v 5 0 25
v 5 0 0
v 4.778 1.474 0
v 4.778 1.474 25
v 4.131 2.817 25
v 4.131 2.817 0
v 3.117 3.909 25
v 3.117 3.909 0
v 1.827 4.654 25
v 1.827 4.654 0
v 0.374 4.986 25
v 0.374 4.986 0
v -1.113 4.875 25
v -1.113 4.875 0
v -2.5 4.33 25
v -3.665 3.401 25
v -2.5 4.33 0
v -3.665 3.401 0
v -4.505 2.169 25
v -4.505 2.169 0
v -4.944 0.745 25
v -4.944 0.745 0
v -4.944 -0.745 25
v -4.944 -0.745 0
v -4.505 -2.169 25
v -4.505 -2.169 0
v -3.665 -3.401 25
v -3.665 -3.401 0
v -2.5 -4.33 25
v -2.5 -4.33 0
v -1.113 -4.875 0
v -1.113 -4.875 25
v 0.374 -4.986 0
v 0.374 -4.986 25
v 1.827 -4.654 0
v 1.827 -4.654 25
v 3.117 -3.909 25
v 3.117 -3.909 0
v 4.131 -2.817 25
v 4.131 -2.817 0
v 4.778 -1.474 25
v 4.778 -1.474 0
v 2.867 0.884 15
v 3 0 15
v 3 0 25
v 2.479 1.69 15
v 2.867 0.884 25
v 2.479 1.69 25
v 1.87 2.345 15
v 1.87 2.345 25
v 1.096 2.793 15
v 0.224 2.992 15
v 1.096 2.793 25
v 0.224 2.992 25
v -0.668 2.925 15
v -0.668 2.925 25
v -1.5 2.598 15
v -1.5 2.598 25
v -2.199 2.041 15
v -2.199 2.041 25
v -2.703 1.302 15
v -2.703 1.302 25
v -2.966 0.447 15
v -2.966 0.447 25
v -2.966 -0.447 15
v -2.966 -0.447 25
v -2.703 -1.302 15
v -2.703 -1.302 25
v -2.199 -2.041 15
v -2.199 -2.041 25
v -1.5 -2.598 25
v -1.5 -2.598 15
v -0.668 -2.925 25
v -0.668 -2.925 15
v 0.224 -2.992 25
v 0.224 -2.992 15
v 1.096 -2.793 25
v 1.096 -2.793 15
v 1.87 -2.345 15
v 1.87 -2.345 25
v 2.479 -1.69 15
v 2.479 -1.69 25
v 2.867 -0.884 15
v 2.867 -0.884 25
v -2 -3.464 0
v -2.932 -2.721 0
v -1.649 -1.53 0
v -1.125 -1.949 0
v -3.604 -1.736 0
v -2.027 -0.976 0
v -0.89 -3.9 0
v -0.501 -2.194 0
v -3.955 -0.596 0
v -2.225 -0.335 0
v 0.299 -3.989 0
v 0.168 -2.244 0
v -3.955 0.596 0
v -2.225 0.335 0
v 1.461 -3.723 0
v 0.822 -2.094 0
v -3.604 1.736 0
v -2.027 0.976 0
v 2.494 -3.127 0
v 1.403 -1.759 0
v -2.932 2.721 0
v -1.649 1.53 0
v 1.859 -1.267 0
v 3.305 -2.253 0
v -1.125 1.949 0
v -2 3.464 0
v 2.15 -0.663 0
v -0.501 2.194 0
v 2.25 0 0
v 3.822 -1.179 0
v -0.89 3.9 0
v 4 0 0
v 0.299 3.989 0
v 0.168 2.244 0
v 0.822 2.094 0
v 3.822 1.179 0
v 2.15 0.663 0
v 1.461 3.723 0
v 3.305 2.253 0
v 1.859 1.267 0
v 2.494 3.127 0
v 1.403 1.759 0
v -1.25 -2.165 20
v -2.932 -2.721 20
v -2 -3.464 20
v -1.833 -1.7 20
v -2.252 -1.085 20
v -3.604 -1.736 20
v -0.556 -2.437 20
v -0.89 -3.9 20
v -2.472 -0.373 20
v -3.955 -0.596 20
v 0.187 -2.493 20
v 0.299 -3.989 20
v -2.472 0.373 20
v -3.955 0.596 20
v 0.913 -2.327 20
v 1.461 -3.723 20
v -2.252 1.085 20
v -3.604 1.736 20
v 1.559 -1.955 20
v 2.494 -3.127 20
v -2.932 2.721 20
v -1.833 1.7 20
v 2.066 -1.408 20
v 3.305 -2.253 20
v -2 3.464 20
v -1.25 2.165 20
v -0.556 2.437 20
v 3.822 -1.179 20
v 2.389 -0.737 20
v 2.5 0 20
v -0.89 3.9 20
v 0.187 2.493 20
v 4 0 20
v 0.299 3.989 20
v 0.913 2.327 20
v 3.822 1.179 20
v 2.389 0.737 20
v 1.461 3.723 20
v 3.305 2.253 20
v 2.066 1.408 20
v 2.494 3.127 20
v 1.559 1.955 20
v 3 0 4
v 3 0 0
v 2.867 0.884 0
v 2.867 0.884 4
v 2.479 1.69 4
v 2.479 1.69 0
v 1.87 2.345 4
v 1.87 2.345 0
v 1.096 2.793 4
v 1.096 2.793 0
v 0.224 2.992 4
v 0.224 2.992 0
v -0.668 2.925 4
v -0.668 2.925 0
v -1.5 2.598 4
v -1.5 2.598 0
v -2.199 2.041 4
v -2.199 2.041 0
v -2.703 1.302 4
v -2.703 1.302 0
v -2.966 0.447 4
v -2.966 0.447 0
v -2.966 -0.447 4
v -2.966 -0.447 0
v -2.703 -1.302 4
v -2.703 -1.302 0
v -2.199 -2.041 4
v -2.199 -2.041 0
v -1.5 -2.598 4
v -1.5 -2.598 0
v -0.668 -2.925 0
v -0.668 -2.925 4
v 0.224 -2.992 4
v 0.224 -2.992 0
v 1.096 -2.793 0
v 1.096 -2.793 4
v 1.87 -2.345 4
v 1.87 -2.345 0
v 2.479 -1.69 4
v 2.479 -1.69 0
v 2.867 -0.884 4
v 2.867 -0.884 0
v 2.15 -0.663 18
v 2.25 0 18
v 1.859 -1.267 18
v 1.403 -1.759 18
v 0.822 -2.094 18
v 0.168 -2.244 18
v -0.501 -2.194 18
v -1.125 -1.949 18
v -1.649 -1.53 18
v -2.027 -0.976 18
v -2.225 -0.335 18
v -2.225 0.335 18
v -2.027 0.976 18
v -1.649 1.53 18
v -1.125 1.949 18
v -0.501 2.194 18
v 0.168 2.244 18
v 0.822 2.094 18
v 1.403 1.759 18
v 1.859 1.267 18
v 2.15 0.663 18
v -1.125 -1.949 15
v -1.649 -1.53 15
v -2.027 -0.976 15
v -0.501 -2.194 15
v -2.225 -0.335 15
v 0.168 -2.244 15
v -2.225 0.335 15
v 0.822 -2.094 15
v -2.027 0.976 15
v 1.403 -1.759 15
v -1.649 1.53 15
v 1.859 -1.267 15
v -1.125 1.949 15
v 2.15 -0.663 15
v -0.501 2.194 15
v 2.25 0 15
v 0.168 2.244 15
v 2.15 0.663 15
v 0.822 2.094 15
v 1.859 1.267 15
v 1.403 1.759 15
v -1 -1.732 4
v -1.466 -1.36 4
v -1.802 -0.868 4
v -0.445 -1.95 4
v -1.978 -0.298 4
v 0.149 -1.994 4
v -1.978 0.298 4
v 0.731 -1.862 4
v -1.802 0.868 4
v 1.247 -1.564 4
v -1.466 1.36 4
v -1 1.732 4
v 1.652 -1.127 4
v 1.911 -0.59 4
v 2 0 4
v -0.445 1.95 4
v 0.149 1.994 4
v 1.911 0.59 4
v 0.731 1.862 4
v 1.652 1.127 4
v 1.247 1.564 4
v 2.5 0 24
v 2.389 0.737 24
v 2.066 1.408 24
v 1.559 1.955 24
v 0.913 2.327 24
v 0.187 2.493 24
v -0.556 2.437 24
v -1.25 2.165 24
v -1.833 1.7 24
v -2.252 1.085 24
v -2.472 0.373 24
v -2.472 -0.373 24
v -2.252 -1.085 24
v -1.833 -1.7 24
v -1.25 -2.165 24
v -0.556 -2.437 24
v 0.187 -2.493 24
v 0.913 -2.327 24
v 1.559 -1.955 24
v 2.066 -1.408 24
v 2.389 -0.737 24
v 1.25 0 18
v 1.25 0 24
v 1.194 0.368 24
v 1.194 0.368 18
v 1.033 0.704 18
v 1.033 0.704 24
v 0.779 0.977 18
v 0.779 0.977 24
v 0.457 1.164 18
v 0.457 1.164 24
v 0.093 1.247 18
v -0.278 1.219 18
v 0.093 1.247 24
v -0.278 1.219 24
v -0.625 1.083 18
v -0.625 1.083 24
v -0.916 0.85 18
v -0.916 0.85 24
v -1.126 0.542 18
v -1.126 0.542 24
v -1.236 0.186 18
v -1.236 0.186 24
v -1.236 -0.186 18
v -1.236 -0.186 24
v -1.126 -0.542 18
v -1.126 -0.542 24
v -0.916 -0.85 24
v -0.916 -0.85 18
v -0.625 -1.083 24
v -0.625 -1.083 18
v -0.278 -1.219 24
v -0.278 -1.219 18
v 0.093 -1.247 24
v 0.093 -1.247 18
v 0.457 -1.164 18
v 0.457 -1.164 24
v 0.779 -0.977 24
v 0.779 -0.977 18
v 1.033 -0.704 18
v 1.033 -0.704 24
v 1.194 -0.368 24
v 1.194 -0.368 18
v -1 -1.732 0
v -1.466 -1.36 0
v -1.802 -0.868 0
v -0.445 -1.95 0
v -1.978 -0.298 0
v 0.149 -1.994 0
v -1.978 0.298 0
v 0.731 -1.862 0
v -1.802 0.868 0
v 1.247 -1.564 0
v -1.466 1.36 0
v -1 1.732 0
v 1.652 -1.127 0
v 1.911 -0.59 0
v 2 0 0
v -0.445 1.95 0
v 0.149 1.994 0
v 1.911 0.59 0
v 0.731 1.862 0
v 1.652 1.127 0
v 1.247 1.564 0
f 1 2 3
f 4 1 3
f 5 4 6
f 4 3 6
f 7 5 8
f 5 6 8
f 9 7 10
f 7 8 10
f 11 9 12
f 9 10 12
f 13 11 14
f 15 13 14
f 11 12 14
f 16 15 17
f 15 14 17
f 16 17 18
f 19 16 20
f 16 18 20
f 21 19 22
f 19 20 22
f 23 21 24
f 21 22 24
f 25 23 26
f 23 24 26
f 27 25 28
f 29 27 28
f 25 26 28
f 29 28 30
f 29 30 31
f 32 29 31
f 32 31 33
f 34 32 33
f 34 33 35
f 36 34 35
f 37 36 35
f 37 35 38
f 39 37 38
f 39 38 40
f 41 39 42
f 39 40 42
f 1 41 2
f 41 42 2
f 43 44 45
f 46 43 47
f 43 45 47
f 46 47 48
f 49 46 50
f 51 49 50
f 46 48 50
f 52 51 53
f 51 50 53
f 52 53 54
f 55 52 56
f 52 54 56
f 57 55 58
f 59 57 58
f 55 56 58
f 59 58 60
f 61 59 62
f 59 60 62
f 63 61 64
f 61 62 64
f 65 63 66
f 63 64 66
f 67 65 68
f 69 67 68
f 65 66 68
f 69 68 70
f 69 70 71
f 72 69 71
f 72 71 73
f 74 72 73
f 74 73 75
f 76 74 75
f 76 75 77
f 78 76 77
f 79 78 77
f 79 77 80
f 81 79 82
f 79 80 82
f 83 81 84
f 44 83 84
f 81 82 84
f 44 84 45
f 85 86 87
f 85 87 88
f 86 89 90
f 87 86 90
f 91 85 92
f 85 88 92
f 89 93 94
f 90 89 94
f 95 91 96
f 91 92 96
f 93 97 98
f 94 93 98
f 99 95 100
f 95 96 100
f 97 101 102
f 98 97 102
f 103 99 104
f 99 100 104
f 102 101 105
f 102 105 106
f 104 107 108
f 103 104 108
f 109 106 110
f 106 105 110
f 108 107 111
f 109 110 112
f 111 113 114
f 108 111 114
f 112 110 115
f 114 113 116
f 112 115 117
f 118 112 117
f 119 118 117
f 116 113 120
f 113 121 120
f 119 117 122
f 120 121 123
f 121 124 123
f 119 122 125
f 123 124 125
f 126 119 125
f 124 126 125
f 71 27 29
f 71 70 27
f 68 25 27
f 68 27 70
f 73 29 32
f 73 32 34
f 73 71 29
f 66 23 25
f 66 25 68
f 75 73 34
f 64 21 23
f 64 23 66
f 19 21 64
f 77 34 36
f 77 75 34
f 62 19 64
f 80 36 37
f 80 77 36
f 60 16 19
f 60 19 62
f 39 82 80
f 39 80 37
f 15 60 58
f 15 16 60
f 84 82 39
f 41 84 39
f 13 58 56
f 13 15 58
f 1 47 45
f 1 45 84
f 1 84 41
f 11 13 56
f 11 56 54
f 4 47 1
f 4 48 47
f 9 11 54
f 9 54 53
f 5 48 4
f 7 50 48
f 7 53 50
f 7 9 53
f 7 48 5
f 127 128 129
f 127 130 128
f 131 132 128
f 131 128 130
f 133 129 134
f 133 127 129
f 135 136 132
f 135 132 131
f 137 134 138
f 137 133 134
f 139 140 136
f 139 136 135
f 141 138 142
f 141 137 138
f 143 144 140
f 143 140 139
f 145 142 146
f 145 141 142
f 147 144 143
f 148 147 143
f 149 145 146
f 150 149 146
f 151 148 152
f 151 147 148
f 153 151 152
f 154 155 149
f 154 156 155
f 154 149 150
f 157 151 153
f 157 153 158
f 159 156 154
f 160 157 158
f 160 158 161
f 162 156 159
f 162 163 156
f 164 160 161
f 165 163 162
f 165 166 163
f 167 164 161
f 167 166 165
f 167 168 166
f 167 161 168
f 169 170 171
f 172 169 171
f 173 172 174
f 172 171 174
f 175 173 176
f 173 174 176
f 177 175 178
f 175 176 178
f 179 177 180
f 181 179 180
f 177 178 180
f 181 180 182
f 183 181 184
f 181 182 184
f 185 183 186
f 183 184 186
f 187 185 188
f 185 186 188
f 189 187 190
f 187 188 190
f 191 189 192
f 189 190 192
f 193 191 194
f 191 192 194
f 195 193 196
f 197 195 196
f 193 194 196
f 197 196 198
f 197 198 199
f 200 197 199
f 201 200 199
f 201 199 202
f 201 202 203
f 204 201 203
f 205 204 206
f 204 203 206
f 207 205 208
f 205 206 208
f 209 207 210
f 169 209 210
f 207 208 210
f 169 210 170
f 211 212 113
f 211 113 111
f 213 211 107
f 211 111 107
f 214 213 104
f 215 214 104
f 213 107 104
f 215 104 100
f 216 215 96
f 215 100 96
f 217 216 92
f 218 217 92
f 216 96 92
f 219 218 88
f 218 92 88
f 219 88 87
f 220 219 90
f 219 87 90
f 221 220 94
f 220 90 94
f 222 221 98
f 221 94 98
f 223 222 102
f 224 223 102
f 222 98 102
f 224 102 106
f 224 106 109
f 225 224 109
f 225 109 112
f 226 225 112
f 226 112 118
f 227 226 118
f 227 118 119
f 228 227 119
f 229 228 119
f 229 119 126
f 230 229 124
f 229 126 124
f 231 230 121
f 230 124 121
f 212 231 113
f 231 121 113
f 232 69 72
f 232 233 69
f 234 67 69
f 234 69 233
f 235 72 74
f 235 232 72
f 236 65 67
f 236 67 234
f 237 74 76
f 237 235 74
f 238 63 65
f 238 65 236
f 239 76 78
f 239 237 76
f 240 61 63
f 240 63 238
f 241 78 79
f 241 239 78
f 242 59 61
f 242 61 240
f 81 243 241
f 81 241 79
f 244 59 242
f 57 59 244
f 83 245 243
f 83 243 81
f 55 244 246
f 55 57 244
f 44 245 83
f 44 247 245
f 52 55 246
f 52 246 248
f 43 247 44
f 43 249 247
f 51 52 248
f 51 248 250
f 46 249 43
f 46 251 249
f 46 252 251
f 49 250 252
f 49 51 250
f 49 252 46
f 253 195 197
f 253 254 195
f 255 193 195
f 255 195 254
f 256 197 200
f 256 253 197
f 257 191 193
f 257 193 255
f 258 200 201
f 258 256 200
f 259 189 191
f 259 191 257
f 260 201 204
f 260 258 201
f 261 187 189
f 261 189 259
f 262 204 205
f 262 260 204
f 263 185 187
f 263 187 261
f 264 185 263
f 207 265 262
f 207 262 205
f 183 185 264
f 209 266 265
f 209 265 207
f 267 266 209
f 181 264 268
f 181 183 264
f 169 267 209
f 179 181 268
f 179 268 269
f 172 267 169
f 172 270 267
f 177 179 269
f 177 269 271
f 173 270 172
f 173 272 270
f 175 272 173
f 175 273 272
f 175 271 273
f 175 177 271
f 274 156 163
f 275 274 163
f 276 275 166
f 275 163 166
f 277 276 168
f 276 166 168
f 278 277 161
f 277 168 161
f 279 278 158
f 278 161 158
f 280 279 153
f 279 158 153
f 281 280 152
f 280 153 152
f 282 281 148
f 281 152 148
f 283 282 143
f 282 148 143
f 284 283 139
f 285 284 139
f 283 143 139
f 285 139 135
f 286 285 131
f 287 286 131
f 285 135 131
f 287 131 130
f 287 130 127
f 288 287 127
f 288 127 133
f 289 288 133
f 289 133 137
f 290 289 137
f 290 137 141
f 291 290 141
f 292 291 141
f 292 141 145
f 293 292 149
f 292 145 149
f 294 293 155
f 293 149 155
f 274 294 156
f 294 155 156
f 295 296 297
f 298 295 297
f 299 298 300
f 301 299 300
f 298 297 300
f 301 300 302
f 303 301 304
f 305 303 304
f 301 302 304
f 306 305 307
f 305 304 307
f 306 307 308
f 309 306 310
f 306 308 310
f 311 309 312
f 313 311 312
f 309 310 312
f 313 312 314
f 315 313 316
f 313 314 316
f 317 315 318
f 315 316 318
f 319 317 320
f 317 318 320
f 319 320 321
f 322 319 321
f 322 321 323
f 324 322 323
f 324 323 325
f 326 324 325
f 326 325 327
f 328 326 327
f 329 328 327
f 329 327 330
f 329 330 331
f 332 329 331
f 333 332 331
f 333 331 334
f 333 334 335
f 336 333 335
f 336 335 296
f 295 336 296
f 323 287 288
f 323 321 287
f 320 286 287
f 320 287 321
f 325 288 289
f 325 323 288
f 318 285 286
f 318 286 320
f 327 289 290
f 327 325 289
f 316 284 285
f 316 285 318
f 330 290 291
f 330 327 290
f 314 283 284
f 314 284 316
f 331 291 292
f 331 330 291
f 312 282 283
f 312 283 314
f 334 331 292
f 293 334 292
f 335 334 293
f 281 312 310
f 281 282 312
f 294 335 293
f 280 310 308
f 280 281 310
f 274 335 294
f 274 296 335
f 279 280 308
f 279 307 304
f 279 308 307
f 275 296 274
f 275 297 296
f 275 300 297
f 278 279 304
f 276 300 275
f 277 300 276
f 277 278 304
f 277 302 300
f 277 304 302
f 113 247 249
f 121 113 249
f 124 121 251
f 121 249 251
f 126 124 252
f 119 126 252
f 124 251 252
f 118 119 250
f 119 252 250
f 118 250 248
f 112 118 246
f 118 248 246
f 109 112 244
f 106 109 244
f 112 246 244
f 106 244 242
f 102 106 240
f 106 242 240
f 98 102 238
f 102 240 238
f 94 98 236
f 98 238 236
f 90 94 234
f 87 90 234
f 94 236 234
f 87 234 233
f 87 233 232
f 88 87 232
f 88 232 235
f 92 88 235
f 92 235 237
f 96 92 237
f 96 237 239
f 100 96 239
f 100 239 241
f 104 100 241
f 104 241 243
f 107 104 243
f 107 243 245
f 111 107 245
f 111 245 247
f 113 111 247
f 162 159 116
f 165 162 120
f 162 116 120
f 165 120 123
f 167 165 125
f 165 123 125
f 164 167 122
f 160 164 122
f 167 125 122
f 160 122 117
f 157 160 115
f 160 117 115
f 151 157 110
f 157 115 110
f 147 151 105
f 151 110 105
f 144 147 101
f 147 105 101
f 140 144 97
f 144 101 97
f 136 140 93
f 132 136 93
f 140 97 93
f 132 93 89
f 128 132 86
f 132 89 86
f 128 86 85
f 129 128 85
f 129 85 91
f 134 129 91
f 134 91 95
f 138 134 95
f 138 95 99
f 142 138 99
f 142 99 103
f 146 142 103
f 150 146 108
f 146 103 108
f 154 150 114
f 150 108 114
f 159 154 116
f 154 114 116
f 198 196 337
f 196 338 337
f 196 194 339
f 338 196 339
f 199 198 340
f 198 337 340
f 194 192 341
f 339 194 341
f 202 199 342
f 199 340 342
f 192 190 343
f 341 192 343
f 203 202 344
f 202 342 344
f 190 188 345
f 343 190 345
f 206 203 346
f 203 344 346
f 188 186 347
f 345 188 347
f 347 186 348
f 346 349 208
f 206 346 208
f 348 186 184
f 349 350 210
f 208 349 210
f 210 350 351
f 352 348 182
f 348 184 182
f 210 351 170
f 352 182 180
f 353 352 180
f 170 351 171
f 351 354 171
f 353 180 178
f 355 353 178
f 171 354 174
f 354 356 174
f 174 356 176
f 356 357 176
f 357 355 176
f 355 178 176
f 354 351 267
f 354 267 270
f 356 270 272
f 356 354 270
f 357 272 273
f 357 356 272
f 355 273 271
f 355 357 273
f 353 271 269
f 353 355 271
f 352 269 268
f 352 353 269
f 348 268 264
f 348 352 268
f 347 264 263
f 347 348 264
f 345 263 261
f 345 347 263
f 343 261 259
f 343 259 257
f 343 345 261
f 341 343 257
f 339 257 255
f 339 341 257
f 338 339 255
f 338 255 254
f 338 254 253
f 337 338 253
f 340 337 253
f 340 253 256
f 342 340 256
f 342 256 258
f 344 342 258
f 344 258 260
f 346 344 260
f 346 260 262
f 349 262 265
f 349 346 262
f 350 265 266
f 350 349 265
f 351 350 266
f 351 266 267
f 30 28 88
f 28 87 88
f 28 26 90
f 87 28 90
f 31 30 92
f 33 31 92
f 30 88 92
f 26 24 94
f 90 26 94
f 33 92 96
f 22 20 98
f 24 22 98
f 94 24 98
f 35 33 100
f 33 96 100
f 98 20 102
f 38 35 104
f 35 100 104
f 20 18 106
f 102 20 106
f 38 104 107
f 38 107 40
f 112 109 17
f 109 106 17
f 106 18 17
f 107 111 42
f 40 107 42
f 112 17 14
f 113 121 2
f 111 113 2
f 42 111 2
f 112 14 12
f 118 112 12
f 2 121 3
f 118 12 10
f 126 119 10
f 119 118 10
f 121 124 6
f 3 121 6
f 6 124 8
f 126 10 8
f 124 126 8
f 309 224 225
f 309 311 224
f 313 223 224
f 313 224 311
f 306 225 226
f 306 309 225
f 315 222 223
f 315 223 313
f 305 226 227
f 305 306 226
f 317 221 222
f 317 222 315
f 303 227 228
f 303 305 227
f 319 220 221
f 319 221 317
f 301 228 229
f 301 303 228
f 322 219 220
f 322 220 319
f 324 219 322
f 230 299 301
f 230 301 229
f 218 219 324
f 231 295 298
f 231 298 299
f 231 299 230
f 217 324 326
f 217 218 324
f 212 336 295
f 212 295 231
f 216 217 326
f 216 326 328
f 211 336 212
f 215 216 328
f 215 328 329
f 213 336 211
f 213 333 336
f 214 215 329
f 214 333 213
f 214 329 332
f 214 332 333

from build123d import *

# Parameters (mm, degrees)
F0_R      = 5
F1_DEPTH  = 25
F2_R      = 2.25
F3_DEPTH  = 25.001
F4_R      = 3
F5_DEPTH  = 10
F6_R      = 4
F7_DEPTH  = 20
F8_R      = 2.5
F9_DEPTH  = 4
F10_R     = 1.25
F11_DEPTH = 24.001
F12_R     = 2.25
F13_DEPTH = 18
F14_R     = 3
F14_R_2   = 2
F15_DEPTH = 4


with BuildPart() as f1:
    # F0 (on Top) → F1 (new body)
    with BuildSketch(Plane.XY):
        Circle(F0_R)
    extrude(amount=F1_DEPTH)

    # F2 (on face) → F3 (cut, through all)
    with BuildSketch(Plane.XY.offset(25)):
        Circle(F2_R)
    extrude(amount=-F3_DEPTH, mode=Mode.SUBTRACT)

    # F4 (on face) → F5 (cut)
    with BuildSketch(Plane.XY.offset(25)):
        Circle(F4_R)
    extrude(amount=-F5_DEPTH, mode=Mode.SUBTRACT)


with BuildPart() as f7:
    # F6 (on Top) → F7 (new body)
    with BuildSketch(Plane.XY):
        Circle(F6_R)
    extrude(amount=F7_DEPTH)

    # F8 (on face) → F9 (join)
    with BuildSketch(Plane.XY.offset(20)):
        Circle(F8_R)
    extrude(amount=F9_DEPTH)

    # F10 (on face) → F11 (cut, through all)
    with BuildSketch(Plane.XY.offset(24)):
        Circle(F10_R)
    extrude(amount=-F11_DEPTH, mode=Mode.SUBTRACT)

    # F12 (on face) → F13 (cut)
    with BuildSketch(Plane(origin=(0, 0, 0), x_dir=(1, 0, 0), z_dir=(0, 0, -1))):
        Circle(F12_R)
    extrude(amount=-F13_DEPTH, mode=Mode.SUBTRACT)


with BuildPart() as f15:
    # F14 (on Top) → F15 (new body)
    with BuildSketch(Plane.XY):
        Circle(F14_R)
        Circle(F14_R_2, mode=Mode.SUBTRACT)
    extrude(amount=F15_DEPTH)


solid = Compound([f1.part, f7.part, f15.part])
